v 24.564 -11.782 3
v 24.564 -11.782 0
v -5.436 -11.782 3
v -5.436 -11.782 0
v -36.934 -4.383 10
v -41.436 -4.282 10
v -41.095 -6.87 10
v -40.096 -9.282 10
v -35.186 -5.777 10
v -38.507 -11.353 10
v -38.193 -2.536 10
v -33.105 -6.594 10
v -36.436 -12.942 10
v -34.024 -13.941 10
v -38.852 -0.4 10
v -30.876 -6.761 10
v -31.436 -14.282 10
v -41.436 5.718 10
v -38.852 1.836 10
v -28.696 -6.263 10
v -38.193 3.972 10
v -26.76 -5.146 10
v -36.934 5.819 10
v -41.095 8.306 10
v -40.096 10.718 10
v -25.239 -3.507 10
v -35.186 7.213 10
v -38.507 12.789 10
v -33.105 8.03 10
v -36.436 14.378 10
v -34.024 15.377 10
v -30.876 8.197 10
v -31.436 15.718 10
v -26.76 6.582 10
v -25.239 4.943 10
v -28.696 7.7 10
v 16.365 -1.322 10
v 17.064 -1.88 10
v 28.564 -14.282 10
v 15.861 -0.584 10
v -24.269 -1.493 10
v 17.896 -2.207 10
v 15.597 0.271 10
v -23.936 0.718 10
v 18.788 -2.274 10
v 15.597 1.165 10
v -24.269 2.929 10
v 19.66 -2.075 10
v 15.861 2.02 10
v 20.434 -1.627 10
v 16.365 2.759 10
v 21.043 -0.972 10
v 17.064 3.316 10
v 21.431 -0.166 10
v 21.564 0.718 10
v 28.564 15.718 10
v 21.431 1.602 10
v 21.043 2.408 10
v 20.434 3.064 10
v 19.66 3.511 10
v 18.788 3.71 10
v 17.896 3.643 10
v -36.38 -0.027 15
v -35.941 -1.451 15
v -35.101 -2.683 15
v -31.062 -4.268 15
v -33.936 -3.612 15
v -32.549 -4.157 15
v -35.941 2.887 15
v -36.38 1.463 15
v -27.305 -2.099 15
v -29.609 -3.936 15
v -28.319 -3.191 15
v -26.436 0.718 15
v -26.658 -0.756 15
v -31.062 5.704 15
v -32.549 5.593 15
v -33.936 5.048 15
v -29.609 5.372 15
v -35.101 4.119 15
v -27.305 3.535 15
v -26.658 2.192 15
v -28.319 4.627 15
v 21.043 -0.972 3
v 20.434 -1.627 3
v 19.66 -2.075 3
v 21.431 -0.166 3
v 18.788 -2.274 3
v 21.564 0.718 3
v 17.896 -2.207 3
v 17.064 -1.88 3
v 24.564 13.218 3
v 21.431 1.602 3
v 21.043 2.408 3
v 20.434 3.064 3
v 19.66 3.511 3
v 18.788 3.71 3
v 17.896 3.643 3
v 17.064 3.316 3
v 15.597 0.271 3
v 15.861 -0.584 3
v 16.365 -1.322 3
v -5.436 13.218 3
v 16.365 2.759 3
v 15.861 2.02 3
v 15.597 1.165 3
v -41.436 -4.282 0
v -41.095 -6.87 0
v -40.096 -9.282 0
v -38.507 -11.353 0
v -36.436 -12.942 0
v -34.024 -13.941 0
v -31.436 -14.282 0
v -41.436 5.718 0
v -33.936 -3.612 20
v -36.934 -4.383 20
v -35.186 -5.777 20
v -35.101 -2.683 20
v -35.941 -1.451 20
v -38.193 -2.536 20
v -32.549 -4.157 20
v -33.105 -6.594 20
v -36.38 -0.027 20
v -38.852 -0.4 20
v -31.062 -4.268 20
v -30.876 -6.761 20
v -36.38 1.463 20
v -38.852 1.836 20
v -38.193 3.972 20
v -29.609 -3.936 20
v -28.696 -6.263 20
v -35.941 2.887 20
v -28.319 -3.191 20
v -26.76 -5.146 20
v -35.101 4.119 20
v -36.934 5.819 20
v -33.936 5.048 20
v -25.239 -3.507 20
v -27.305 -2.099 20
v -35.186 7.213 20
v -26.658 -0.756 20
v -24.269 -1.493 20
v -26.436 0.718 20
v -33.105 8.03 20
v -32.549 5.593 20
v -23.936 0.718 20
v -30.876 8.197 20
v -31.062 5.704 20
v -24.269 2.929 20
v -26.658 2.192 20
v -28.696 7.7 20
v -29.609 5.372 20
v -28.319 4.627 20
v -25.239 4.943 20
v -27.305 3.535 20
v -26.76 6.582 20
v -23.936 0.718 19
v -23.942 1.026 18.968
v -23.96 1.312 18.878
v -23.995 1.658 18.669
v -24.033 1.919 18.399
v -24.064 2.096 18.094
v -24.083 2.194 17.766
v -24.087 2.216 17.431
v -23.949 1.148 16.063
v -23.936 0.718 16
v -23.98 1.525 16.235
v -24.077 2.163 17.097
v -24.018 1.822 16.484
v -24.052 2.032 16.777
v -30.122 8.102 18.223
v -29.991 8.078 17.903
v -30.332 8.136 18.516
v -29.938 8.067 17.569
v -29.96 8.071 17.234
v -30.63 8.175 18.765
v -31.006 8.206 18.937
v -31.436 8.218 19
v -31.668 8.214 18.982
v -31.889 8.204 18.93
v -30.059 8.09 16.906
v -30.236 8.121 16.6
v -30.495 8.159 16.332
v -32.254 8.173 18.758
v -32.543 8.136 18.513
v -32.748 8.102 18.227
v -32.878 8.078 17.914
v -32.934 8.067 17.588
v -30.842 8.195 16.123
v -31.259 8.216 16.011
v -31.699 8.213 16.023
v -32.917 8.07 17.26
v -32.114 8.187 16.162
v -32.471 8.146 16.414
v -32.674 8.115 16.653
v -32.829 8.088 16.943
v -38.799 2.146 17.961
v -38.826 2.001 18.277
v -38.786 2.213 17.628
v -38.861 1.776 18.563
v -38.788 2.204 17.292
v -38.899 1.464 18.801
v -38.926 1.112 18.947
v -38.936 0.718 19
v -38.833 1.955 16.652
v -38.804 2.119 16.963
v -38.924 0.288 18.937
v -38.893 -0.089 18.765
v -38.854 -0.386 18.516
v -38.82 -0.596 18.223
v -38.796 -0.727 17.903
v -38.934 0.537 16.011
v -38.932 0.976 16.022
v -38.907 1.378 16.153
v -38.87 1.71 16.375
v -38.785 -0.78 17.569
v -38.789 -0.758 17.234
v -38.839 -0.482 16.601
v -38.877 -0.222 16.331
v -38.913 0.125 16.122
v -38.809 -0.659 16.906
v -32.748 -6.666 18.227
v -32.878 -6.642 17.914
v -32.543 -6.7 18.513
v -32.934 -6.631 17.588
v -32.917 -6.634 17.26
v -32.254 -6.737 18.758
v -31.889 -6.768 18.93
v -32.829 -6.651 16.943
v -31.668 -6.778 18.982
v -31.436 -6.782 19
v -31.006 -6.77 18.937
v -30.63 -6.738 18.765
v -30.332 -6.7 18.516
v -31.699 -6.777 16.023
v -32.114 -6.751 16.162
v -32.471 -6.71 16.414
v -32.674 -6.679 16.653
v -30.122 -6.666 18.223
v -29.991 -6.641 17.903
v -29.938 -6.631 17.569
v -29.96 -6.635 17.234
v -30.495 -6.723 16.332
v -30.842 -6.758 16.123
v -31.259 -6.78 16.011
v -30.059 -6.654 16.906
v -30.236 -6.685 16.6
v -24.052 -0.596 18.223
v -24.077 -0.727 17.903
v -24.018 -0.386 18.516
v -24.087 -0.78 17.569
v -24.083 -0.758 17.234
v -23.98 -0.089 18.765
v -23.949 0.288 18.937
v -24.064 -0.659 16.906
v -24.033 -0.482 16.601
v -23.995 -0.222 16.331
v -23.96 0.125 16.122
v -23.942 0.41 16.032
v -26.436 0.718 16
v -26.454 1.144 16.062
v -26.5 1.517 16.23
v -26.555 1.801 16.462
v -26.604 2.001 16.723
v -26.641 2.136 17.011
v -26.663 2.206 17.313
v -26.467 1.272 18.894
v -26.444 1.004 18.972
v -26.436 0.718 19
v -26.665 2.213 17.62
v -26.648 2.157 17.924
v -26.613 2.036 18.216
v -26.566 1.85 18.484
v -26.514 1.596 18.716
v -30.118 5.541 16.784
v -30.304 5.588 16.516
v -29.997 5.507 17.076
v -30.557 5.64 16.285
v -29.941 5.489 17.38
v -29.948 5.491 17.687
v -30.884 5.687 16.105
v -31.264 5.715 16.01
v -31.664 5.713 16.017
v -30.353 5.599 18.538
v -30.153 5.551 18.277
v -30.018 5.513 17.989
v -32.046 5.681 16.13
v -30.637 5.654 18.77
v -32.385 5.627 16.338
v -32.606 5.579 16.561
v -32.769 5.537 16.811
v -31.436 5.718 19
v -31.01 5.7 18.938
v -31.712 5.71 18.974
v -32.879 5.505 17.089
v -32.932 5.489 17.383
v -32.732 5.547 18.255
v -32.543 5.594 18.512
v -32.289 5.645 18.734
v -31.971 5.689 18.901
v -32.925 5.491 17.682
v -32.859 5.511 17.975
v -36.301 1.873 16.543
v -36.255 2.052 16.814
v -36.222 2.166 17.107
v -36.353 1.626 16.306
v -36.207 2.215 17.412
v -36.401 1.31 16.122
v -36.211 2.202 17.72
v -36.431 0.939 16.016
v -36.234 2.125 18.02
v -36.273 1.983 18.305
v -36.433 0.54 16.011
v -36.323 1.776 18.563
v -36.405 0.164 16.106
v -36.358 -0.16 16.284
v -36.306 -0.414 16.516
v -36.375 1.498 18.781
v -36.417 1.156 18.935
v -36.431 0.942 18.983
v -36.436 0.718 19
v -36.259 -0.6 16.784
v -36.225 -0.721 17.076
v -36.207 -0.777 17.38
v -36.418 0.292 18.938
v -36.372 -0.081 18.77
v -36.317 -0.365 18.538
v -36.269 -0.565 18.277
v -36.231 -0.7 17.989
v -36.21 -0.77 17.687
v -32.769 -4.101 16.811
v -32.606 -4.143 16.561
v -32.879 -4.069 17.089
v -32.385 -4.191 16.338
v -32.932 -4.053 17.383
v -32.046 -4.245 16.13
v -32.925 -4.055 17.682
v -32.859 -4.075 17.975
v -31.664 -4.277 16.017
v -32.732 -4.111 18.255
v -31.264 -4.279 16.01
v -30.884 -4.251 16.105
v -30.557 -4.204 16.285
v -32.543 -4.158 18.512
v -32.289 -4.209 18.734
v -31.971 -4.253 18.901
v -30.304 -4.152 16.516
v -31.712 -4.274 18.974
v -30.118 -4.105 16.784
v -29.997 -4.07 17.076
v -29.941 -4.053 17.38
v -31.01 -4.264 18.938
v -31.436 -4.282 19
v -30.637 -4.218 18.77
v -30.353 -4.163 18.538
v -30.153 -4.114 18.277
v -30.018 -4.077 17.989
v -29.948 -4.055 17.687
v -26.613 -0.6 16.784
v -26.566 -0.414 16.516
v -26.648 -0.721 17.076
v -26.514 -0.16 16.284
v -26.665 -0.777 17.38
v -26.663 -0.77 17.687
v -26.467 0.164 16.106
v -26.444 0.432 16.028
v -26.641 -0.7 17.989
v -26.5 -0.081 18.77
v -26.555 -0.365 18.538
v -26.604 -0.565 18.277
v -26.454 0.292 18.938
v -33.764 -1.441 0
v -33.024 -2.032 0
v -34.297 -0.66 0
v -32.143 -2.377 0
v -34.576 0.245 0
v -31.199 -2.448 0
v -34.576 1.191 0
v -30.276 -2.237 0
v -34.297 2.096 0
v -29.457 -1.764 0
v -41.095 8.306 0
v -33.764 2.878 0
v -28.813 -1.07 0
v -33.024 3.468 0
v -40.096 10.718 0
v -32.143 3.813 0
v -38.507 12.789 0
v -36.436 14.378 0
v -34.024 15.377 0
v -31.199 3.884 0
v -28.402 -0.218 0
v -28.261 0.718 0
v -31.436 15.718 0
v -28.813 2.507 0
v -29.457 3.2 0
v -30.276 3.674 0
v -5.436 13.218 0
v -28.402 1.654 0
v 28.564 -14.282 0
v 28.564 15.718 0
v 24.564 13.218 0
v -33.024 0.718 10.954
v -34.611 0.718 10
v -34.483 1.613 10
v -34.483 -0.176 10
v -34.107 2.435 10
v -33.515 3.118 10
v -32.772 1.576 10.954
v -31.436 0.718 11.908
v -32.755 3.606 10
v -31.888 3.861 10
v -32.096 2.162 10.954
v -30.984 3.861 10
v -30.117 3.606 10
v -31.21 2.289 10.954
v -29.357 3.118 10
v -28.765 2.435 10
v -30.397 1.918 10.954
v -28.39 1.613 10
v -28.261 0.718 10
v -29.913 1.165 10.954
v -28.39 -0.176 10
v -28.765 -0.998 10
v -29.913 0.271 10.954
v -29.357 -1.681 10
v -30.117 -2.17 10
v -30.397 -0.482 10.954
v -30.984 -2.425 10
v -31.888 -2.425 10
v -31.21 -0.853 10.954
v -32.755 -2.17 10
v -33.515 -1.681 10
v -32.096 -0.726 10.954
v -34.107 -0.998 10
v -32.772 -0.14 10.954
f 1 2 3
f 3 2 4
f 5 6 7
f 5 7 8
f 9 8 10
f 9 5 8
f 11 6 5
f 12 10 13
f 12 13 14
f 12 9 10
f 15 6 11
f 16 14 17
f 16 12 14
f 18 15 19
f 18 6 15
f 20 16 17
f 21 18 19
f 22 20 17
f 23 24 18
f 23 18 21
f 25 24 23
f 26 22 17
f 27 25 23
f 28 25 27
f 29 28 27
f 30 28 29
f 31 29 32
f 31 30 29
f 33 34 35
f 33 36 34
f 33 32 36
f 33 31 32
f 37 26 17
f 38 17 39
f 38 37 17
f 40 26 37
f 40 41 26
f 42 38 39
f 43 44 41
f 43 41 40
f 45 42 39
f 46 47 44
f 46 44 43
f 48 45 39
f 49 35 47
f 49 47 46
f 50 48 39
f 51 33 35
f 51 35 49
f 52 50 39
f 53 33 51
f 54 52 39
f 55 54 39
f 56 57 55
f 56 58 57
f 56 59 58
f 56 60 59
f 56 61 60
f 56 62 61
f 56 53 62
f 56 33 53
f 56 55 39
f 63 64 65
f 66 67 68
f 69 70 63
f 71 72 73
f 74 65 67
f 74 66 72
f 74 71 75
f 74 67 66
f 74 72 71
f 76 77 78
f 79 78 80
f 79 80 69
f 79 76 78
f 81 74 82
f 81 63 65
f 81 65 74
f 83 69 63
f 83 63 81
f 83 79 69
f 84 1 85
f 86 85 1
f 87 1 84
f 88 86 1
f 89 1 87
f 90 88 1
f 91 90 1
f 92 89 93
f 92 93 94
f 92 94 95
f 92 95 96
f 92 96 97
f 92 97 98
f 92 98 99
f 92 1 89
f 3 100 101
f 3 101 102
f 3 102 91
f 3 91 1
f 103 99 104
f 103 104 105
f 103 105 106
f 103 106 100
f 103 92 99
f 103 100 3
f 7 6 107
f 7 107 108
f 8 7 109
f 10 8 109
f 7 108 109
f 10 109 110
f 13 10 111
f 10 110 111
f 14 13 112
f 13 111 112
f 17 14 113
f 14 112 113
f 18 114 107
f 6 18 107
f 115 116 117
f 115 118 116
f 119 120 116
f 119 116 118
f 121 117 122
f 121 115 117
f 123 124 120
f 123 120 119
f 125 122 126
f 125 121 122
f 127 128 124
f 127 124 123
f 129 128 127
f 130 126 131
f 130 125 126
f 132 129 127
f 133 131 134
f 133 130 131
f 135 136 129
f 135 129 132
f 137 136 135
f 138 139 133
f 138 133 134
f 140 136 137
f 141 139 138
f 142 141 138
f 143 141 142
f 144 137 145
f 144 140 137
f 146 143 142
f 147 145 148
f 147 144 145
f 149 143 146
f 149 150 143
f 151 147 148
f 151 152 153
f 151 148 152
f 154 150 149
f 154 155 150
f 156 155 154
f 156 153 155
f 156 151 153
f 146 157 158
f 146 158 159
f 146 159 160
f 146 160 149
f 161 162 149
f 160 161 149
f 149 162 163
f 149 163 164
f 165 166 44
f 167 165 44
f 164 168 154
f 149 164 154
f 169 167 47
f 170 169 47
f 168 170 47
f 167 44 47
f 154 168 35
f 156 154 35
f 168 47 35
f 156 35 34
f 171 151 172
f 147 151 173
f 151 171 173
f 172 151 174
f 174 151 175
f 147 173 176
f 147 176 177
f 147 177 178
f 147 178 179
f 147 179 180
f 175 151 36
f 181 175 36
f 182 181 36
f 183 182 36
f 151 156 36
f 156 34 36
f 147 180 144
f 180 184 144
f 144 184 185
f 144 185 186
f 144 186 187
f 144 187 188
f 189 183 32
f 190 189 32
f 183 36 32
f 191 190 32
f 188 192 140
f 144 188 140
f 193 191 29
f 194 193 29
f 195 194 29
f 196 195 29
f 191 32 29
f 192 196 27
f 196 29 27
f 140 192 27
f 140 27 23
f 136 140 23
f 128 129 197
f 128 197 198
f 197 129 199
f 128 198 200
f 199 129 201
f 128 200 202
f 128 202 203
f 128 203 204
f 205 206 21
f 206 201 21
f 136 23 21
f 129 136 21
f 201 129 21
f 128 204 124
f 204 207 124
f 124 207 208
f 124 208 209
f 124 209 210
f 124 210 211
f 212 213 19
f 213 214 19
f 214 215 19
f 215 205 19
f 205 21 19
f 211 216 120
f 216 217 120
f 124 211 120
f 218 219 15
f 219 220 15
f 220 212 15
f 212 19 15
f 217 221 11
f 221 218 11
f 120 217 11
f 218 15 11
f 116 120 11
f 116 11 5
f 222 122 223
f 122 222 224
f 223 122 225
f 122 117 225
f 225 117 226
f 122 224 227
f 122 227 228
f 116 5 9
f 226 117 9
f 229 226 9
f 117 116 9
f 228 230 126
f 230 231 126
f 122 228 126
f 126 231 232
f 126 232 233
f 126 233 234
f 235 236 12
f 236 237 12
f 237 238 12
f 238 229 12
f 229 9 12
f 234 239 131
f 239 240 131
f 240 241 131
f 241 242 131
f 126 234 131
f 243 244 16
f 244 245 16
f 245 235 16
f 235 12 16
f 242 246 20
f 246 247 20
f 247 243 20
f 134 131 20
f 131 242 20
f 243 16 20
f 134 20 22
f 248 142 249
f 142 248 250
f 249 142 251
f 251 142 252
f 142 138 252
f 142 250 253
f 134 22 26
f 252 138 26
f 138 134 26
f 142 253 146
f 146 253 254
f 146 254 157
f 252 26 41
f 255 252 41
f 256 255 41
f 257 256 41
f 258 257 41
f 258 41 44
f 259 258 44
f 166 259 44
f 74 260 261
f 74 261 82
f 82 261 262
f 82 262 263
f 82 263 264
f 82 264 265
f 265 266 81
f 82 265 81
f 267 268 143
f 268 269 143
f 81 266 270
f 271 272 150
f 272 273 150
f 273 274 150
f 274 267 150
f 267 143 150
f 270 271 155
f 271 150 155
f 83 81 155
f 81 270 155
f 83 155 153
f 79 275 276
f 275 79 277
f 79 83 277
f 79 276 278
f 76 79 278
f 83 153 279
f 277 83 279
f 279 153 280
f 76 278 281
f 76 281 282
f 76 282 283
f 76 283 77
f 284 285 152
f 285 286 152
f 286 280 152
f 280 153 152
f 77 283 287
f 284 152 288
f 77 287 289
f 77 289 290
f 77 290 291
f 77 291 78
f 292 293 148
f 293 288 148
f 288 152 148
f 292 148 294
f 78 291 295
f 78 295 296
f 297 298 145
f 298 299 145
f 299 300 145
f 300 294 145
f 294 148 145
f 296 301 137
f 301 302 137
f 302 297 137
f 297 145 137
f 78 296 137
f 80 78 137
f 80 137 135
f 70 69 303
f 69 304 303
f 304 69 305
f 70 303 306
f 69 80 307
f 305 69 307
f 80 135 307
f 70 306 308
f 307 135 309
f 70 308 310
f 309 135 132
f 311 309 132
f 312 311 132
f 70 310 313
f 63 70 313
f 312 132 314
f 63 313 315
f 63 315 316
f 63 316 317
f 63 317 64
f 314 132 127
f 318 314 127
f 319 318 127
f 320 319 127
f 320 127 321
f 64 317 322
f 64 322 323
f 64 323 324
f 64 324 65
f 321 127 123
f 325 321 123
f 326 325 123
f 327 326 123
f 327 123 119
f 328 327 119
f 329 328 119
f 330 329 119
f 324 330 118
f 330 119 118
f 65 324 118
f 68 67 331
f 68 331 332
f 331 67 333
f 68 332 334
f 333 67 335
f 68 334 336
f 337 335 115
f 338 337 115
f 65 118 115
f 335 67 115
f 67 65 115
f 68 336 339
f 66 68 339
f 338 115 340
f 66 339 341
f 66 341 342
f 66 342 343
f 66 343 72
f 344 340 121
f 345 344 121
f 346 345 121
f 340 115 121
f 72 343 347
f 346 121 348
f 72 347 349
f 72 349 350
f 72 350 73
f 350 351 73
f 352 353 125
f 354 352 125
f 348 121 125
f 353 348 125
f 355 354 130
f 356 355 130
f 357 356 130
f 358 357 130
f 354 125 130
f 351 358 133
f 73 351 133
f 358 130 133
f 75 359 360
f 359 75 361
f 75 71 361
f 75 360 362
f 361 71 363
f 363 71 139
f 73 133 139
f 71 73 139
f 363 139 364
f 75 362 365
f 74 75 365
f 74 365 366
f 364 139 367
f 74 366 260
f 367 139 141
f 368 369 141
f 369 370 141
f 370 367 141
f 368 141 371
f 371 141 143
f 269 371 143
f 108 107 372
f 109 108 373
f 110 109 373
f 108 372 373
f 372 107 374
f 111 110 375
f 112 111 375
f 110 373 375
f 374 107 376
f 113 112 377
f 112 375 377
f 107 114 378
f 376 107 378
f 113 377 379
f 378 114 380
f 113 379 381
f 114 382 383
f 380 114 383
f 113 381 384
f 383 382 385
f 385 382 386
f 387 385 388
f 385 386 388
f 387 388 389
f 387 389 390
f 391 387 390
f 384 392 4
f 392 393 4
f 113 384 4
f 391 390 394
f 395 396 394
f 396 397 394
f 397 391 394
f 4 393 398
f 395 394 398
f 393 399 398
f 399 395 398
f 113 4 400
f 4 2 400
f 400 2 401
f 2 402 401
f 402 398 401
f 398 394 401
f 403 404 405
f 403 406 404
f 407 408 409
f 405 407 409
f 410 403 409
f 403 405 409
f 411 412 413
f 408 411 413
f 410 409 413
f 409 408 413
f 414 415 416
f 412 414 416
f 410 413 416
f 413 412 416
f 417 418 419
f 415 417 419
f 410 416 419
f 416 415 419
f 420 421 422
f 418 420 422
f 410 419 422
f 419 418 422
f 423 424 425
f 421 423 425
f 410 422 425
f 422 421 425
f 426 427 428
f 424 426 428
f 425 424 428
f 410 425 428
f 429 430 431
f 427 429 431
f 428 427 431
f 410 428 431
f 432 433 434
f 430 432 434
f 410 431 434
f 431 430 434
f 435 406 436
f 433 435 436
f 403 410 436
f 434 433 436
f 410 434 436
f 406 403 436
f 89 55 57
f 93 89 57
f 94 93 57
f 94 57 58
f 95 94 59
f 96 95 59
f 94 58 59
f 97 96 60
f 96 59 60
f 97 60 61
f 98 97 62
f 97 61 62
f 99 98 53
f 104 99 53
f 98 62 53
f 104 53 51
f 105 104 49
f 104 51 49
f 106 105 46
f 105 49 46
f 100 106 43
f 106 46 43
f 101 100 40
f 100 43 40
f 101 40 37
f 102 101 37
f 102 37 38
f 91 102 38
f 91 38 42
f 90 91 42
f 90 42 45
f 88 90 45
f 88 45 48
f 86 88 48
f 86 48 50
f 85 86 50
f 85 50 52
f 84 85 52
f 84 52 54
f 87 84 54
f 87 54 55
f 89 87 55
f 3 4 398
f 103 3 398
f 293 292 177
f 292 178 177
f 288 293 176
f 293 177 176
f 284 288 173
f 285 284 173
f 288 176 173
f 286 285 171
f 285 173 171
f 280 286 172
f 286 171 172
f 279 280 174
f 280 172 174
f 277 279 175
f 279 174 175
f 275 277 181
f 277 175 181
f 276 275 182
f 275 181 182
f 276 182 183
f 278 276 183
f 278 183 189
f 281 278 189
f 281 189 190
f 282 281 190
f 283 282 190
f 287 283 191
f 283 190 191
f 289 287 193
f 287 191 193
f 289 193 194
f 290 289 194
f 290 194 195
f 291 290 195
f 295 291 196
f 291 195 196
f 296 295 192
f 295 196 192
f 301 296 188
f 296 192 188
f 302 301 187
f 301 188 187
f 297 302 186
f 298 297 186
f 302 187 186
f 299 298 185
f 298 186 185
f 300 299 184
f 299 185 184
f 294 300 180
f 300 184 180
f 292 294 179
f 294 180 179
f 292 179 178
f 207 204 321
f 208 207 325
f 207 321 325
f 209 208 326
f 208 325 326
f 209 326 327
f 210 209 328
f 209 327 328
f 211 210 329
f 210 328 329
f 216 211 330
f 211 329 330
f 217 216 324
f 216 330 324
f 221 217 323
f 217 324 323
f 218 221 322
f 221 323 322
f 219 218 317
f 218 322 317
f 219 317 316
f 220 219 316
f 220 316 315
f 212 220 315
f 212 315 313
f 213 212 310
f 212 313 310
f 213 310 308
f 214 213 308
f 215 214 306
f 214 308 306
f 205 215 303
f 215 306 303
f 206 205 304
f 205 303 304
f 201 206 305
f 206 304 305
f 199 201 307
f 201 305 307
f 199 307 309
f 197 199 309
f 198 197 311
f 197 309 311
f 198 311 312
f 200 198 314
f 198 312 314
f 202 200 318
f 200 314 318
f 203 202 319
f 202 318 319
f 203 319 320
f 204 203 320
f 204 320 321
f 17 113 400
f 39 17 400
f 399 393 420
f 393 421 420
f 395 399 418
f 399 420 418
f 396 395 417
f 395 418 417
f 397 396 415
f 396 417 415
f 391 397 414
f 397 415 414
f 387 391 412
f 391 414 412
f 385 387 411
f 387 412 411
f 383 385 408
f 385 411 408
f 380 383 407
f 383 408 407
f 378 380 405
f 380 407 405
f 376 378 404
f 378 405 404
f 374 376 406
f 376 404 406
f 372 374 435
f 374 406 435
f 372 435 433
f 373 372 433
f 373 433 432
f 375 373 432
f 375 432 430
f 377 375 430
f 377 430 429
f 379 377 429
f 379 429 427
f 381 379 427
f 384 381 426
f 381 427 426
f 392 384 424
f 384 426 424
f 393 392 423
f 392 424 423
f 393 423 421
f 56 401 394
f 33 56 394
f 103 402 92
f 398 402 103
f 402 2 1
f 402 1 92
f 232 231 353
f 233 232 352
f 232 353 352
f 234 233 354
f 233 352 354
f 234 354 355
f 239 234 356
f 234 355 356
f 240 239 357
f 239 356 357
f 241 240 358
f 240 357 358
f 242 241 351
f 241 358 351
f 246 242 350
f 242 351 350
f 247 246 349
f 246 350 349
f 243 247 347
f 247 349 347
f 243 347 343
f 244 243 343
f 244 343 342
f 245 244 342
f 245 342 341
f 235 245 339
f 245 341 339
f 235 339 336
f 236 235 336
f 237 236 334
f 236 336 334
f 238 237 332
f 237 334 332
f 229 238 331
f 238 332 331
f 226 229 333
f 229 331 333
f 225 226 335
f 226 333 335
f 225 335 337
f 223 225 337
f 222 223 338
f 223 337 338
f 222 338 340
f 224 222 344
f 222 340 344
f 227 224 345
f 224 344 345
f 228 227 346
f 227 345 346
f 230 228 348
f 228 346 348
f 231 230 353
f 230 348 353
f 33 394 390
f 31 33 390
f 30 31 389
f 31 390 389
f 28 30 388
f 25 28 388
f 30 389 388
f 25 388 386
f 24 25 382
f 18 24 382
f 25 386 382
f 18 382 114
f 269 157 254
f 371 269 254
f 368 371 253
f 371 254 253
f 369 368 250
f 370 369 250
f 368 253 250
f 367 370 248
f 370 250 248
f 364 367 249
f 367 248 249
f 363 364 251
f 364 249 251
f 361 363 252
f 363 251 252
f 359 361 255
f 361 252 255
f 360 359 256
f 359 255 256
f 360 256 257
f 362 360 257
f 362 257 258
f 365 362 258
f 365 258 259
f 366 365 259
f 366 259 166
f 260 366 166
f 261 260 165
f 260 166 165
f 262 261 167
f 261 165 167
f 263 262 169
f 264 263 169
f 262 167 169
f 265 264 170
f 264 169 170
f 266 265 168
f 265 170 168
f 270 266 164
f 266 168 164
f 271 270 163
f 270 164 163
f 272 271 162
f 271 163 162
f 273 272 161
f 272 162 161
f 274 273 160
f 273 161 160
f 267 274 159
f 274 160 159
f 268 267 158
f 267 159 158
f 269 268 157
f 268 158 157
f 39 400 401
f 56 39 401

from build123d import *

# Parameters (mm, degrees)
BOSS_EXTRUDE1_DEPTH             = 10
SKETCH6_W                       = 30
SKETCH6_H                       = 25
CUT_EXTRUDE1_DEPTH              = 3
SKETCH8_R                       = 3
CUT_EXTRUDE2_DEPTH              = 10
SKETCH9_R                       = 7.5
BOSS_EXTRUDE2_DEPTH             = 10
SKETCH10_R                      = 5
CUT_EXTRUDE3_DEPTH              = 5
SKETCH11_R                      = 1.5
CUT_EXTRUDE4_DEPTH              = 49.621106648
CIRPATTERN1_COUNT               = 2
CIRPATTERN1_ANGLE               = 90
F_1_4_0_25_DIAMETER_HOLE1_D     = 6.35
F_1_4_0_25_DIAMETER_HOLE1_DEPTH = 10
F_1_4_0_25_DIAMETER_HOLE1_TIP   = 1.907732465


with BuildPart() as part:
    # Sketch1 → Boss-Extrude1 (new body)
    with BuildSketch(Plane.XY):
        with BuildLine():
            Line((-41.436145974, 5.718072987), (-41.436145974, -4.281927013))
            ThreePointArc((-41.436145974, -4.281927013), (-38.507213786, -11.352994825), (-31.436145974, -14.281927013))
            Line((-31.436145974, -14.281927013), (28.563854026, -14.281927013))
            Line((28.563854026, -14.281927013), (28.563854026, 15.718072987))
            Line((28.563854026, 15.718072987), (-31.436145974, 15.718072987))
            ThreePointArc((-31.436145974, 15.718072987), (-38.507213786, 12.789140799), (-41.436145974, 5.718072987))
        make_face()
    extrude(amount=BOSS_EXTRUDE1_DEPTH)

    # Sketch6 → Cut-Extrude1 (cut)
    with BuildSketch(Plane(origin=(0, 0, 0), x_dir=(-1, 0, 0), z_dir=(0, 0, -1))):
        with Locations((-9.563854026, 0.718072987)):
            Rectangle(SKETCH6_W, SKETCH6_H)
    extrude(amount=-CUT_EXTRUDE1_DEPTH, mode=Mode.SUBTRACT)

    # Sketch8 → Cut-Extrude2 (cut)
    with BuildSketch(Plane.XY.offset(10)):
        with Locations((18.563854026, 0.718072987)):
            Circle(SKETCH8_R)
    extrude(amount=-CUT_EXTRUDE2_DEPTH, mode=Mode.SUBTRACT)

    # Sketch9 → Boss-Extrude2 (add)
    with BuildSketch(Plane.XY.offset(10)):
        with Locations((-31.436145974, 0.718072987)):
            Circle(SKETCH9_R)
    extrude(amount=BOSS_EXTRUDE2_DEPTH)

    # Sketch10 → Cut-Extrude3 (cut)
    with BuildSketch(Plane.XY.offset(20)):
        with Locations((-31.436145974, 0.718072987)):
            Circle(SKETCH10_R)
    extrude(amount=-CUT_EXTRUDE3_DEPTH, mode=Mode.SUBTRACT)

    # Sketch11 → Cut-Extrude4 (cut, symmetric)
    with BuildSketch(Plane(origin=(0, 0, 0), x_dir=(1, 0, 0), z_dir=(0, 1, 0))):
        with Locations(Location((-31.436145974, -17.5, 0), (0, 0, 270))):
            Circle(SKETCH11_R)
    cut_extrude4 = extrude(amount=CUT_EXTRUDE4_DEPTH, both=True, mode=Mode.SUBTRACT)

    # CirPattern1: Cut-Extrude4 ×2 about axis
    cirpattern1_axis = Axis((-31.436145974, 0.718072987, 20), (0, 0, -1))
    for i in range(1, CIRPATTERN1_COUNT):
        add(cut_extrude4.rotate(cirpattern1_axis, i * CIRPATTERN1_ANGLE / (CIRPATTERN1_COUNT - 1)), mode=Mode.SUBTRACT)

    # 1/4 (0.25) Diameter Hole1
    with Locations(Plane(origin=(0, 0, 0), x_dir=(-1, 0, 0), z_dir=(0, 0, -1))):
        with Locations((31.436145974, 0.718072987)):
            Hole(F_1_4_0_25_DIAMETER_HOLE1_D / 2, depth=F_1_4_0_25_DIAMETER_HOLE1_DEPTH)
            with Locations((0, 0, -(F_1_4_0_25_DIAMETER_HOLE1_DEPTH + F_1_4_0_25_DIAMETER_HOLE1_TIP / 2))):  # 118° drill point
                Cone(0, F_1_4_0_25_DIAMETER_HOLE1_D / 2, F_1_4_0_25_DIAMETER_HOLE1_TIP, mode=Mode.SUBTRACT)


solid = part.part
